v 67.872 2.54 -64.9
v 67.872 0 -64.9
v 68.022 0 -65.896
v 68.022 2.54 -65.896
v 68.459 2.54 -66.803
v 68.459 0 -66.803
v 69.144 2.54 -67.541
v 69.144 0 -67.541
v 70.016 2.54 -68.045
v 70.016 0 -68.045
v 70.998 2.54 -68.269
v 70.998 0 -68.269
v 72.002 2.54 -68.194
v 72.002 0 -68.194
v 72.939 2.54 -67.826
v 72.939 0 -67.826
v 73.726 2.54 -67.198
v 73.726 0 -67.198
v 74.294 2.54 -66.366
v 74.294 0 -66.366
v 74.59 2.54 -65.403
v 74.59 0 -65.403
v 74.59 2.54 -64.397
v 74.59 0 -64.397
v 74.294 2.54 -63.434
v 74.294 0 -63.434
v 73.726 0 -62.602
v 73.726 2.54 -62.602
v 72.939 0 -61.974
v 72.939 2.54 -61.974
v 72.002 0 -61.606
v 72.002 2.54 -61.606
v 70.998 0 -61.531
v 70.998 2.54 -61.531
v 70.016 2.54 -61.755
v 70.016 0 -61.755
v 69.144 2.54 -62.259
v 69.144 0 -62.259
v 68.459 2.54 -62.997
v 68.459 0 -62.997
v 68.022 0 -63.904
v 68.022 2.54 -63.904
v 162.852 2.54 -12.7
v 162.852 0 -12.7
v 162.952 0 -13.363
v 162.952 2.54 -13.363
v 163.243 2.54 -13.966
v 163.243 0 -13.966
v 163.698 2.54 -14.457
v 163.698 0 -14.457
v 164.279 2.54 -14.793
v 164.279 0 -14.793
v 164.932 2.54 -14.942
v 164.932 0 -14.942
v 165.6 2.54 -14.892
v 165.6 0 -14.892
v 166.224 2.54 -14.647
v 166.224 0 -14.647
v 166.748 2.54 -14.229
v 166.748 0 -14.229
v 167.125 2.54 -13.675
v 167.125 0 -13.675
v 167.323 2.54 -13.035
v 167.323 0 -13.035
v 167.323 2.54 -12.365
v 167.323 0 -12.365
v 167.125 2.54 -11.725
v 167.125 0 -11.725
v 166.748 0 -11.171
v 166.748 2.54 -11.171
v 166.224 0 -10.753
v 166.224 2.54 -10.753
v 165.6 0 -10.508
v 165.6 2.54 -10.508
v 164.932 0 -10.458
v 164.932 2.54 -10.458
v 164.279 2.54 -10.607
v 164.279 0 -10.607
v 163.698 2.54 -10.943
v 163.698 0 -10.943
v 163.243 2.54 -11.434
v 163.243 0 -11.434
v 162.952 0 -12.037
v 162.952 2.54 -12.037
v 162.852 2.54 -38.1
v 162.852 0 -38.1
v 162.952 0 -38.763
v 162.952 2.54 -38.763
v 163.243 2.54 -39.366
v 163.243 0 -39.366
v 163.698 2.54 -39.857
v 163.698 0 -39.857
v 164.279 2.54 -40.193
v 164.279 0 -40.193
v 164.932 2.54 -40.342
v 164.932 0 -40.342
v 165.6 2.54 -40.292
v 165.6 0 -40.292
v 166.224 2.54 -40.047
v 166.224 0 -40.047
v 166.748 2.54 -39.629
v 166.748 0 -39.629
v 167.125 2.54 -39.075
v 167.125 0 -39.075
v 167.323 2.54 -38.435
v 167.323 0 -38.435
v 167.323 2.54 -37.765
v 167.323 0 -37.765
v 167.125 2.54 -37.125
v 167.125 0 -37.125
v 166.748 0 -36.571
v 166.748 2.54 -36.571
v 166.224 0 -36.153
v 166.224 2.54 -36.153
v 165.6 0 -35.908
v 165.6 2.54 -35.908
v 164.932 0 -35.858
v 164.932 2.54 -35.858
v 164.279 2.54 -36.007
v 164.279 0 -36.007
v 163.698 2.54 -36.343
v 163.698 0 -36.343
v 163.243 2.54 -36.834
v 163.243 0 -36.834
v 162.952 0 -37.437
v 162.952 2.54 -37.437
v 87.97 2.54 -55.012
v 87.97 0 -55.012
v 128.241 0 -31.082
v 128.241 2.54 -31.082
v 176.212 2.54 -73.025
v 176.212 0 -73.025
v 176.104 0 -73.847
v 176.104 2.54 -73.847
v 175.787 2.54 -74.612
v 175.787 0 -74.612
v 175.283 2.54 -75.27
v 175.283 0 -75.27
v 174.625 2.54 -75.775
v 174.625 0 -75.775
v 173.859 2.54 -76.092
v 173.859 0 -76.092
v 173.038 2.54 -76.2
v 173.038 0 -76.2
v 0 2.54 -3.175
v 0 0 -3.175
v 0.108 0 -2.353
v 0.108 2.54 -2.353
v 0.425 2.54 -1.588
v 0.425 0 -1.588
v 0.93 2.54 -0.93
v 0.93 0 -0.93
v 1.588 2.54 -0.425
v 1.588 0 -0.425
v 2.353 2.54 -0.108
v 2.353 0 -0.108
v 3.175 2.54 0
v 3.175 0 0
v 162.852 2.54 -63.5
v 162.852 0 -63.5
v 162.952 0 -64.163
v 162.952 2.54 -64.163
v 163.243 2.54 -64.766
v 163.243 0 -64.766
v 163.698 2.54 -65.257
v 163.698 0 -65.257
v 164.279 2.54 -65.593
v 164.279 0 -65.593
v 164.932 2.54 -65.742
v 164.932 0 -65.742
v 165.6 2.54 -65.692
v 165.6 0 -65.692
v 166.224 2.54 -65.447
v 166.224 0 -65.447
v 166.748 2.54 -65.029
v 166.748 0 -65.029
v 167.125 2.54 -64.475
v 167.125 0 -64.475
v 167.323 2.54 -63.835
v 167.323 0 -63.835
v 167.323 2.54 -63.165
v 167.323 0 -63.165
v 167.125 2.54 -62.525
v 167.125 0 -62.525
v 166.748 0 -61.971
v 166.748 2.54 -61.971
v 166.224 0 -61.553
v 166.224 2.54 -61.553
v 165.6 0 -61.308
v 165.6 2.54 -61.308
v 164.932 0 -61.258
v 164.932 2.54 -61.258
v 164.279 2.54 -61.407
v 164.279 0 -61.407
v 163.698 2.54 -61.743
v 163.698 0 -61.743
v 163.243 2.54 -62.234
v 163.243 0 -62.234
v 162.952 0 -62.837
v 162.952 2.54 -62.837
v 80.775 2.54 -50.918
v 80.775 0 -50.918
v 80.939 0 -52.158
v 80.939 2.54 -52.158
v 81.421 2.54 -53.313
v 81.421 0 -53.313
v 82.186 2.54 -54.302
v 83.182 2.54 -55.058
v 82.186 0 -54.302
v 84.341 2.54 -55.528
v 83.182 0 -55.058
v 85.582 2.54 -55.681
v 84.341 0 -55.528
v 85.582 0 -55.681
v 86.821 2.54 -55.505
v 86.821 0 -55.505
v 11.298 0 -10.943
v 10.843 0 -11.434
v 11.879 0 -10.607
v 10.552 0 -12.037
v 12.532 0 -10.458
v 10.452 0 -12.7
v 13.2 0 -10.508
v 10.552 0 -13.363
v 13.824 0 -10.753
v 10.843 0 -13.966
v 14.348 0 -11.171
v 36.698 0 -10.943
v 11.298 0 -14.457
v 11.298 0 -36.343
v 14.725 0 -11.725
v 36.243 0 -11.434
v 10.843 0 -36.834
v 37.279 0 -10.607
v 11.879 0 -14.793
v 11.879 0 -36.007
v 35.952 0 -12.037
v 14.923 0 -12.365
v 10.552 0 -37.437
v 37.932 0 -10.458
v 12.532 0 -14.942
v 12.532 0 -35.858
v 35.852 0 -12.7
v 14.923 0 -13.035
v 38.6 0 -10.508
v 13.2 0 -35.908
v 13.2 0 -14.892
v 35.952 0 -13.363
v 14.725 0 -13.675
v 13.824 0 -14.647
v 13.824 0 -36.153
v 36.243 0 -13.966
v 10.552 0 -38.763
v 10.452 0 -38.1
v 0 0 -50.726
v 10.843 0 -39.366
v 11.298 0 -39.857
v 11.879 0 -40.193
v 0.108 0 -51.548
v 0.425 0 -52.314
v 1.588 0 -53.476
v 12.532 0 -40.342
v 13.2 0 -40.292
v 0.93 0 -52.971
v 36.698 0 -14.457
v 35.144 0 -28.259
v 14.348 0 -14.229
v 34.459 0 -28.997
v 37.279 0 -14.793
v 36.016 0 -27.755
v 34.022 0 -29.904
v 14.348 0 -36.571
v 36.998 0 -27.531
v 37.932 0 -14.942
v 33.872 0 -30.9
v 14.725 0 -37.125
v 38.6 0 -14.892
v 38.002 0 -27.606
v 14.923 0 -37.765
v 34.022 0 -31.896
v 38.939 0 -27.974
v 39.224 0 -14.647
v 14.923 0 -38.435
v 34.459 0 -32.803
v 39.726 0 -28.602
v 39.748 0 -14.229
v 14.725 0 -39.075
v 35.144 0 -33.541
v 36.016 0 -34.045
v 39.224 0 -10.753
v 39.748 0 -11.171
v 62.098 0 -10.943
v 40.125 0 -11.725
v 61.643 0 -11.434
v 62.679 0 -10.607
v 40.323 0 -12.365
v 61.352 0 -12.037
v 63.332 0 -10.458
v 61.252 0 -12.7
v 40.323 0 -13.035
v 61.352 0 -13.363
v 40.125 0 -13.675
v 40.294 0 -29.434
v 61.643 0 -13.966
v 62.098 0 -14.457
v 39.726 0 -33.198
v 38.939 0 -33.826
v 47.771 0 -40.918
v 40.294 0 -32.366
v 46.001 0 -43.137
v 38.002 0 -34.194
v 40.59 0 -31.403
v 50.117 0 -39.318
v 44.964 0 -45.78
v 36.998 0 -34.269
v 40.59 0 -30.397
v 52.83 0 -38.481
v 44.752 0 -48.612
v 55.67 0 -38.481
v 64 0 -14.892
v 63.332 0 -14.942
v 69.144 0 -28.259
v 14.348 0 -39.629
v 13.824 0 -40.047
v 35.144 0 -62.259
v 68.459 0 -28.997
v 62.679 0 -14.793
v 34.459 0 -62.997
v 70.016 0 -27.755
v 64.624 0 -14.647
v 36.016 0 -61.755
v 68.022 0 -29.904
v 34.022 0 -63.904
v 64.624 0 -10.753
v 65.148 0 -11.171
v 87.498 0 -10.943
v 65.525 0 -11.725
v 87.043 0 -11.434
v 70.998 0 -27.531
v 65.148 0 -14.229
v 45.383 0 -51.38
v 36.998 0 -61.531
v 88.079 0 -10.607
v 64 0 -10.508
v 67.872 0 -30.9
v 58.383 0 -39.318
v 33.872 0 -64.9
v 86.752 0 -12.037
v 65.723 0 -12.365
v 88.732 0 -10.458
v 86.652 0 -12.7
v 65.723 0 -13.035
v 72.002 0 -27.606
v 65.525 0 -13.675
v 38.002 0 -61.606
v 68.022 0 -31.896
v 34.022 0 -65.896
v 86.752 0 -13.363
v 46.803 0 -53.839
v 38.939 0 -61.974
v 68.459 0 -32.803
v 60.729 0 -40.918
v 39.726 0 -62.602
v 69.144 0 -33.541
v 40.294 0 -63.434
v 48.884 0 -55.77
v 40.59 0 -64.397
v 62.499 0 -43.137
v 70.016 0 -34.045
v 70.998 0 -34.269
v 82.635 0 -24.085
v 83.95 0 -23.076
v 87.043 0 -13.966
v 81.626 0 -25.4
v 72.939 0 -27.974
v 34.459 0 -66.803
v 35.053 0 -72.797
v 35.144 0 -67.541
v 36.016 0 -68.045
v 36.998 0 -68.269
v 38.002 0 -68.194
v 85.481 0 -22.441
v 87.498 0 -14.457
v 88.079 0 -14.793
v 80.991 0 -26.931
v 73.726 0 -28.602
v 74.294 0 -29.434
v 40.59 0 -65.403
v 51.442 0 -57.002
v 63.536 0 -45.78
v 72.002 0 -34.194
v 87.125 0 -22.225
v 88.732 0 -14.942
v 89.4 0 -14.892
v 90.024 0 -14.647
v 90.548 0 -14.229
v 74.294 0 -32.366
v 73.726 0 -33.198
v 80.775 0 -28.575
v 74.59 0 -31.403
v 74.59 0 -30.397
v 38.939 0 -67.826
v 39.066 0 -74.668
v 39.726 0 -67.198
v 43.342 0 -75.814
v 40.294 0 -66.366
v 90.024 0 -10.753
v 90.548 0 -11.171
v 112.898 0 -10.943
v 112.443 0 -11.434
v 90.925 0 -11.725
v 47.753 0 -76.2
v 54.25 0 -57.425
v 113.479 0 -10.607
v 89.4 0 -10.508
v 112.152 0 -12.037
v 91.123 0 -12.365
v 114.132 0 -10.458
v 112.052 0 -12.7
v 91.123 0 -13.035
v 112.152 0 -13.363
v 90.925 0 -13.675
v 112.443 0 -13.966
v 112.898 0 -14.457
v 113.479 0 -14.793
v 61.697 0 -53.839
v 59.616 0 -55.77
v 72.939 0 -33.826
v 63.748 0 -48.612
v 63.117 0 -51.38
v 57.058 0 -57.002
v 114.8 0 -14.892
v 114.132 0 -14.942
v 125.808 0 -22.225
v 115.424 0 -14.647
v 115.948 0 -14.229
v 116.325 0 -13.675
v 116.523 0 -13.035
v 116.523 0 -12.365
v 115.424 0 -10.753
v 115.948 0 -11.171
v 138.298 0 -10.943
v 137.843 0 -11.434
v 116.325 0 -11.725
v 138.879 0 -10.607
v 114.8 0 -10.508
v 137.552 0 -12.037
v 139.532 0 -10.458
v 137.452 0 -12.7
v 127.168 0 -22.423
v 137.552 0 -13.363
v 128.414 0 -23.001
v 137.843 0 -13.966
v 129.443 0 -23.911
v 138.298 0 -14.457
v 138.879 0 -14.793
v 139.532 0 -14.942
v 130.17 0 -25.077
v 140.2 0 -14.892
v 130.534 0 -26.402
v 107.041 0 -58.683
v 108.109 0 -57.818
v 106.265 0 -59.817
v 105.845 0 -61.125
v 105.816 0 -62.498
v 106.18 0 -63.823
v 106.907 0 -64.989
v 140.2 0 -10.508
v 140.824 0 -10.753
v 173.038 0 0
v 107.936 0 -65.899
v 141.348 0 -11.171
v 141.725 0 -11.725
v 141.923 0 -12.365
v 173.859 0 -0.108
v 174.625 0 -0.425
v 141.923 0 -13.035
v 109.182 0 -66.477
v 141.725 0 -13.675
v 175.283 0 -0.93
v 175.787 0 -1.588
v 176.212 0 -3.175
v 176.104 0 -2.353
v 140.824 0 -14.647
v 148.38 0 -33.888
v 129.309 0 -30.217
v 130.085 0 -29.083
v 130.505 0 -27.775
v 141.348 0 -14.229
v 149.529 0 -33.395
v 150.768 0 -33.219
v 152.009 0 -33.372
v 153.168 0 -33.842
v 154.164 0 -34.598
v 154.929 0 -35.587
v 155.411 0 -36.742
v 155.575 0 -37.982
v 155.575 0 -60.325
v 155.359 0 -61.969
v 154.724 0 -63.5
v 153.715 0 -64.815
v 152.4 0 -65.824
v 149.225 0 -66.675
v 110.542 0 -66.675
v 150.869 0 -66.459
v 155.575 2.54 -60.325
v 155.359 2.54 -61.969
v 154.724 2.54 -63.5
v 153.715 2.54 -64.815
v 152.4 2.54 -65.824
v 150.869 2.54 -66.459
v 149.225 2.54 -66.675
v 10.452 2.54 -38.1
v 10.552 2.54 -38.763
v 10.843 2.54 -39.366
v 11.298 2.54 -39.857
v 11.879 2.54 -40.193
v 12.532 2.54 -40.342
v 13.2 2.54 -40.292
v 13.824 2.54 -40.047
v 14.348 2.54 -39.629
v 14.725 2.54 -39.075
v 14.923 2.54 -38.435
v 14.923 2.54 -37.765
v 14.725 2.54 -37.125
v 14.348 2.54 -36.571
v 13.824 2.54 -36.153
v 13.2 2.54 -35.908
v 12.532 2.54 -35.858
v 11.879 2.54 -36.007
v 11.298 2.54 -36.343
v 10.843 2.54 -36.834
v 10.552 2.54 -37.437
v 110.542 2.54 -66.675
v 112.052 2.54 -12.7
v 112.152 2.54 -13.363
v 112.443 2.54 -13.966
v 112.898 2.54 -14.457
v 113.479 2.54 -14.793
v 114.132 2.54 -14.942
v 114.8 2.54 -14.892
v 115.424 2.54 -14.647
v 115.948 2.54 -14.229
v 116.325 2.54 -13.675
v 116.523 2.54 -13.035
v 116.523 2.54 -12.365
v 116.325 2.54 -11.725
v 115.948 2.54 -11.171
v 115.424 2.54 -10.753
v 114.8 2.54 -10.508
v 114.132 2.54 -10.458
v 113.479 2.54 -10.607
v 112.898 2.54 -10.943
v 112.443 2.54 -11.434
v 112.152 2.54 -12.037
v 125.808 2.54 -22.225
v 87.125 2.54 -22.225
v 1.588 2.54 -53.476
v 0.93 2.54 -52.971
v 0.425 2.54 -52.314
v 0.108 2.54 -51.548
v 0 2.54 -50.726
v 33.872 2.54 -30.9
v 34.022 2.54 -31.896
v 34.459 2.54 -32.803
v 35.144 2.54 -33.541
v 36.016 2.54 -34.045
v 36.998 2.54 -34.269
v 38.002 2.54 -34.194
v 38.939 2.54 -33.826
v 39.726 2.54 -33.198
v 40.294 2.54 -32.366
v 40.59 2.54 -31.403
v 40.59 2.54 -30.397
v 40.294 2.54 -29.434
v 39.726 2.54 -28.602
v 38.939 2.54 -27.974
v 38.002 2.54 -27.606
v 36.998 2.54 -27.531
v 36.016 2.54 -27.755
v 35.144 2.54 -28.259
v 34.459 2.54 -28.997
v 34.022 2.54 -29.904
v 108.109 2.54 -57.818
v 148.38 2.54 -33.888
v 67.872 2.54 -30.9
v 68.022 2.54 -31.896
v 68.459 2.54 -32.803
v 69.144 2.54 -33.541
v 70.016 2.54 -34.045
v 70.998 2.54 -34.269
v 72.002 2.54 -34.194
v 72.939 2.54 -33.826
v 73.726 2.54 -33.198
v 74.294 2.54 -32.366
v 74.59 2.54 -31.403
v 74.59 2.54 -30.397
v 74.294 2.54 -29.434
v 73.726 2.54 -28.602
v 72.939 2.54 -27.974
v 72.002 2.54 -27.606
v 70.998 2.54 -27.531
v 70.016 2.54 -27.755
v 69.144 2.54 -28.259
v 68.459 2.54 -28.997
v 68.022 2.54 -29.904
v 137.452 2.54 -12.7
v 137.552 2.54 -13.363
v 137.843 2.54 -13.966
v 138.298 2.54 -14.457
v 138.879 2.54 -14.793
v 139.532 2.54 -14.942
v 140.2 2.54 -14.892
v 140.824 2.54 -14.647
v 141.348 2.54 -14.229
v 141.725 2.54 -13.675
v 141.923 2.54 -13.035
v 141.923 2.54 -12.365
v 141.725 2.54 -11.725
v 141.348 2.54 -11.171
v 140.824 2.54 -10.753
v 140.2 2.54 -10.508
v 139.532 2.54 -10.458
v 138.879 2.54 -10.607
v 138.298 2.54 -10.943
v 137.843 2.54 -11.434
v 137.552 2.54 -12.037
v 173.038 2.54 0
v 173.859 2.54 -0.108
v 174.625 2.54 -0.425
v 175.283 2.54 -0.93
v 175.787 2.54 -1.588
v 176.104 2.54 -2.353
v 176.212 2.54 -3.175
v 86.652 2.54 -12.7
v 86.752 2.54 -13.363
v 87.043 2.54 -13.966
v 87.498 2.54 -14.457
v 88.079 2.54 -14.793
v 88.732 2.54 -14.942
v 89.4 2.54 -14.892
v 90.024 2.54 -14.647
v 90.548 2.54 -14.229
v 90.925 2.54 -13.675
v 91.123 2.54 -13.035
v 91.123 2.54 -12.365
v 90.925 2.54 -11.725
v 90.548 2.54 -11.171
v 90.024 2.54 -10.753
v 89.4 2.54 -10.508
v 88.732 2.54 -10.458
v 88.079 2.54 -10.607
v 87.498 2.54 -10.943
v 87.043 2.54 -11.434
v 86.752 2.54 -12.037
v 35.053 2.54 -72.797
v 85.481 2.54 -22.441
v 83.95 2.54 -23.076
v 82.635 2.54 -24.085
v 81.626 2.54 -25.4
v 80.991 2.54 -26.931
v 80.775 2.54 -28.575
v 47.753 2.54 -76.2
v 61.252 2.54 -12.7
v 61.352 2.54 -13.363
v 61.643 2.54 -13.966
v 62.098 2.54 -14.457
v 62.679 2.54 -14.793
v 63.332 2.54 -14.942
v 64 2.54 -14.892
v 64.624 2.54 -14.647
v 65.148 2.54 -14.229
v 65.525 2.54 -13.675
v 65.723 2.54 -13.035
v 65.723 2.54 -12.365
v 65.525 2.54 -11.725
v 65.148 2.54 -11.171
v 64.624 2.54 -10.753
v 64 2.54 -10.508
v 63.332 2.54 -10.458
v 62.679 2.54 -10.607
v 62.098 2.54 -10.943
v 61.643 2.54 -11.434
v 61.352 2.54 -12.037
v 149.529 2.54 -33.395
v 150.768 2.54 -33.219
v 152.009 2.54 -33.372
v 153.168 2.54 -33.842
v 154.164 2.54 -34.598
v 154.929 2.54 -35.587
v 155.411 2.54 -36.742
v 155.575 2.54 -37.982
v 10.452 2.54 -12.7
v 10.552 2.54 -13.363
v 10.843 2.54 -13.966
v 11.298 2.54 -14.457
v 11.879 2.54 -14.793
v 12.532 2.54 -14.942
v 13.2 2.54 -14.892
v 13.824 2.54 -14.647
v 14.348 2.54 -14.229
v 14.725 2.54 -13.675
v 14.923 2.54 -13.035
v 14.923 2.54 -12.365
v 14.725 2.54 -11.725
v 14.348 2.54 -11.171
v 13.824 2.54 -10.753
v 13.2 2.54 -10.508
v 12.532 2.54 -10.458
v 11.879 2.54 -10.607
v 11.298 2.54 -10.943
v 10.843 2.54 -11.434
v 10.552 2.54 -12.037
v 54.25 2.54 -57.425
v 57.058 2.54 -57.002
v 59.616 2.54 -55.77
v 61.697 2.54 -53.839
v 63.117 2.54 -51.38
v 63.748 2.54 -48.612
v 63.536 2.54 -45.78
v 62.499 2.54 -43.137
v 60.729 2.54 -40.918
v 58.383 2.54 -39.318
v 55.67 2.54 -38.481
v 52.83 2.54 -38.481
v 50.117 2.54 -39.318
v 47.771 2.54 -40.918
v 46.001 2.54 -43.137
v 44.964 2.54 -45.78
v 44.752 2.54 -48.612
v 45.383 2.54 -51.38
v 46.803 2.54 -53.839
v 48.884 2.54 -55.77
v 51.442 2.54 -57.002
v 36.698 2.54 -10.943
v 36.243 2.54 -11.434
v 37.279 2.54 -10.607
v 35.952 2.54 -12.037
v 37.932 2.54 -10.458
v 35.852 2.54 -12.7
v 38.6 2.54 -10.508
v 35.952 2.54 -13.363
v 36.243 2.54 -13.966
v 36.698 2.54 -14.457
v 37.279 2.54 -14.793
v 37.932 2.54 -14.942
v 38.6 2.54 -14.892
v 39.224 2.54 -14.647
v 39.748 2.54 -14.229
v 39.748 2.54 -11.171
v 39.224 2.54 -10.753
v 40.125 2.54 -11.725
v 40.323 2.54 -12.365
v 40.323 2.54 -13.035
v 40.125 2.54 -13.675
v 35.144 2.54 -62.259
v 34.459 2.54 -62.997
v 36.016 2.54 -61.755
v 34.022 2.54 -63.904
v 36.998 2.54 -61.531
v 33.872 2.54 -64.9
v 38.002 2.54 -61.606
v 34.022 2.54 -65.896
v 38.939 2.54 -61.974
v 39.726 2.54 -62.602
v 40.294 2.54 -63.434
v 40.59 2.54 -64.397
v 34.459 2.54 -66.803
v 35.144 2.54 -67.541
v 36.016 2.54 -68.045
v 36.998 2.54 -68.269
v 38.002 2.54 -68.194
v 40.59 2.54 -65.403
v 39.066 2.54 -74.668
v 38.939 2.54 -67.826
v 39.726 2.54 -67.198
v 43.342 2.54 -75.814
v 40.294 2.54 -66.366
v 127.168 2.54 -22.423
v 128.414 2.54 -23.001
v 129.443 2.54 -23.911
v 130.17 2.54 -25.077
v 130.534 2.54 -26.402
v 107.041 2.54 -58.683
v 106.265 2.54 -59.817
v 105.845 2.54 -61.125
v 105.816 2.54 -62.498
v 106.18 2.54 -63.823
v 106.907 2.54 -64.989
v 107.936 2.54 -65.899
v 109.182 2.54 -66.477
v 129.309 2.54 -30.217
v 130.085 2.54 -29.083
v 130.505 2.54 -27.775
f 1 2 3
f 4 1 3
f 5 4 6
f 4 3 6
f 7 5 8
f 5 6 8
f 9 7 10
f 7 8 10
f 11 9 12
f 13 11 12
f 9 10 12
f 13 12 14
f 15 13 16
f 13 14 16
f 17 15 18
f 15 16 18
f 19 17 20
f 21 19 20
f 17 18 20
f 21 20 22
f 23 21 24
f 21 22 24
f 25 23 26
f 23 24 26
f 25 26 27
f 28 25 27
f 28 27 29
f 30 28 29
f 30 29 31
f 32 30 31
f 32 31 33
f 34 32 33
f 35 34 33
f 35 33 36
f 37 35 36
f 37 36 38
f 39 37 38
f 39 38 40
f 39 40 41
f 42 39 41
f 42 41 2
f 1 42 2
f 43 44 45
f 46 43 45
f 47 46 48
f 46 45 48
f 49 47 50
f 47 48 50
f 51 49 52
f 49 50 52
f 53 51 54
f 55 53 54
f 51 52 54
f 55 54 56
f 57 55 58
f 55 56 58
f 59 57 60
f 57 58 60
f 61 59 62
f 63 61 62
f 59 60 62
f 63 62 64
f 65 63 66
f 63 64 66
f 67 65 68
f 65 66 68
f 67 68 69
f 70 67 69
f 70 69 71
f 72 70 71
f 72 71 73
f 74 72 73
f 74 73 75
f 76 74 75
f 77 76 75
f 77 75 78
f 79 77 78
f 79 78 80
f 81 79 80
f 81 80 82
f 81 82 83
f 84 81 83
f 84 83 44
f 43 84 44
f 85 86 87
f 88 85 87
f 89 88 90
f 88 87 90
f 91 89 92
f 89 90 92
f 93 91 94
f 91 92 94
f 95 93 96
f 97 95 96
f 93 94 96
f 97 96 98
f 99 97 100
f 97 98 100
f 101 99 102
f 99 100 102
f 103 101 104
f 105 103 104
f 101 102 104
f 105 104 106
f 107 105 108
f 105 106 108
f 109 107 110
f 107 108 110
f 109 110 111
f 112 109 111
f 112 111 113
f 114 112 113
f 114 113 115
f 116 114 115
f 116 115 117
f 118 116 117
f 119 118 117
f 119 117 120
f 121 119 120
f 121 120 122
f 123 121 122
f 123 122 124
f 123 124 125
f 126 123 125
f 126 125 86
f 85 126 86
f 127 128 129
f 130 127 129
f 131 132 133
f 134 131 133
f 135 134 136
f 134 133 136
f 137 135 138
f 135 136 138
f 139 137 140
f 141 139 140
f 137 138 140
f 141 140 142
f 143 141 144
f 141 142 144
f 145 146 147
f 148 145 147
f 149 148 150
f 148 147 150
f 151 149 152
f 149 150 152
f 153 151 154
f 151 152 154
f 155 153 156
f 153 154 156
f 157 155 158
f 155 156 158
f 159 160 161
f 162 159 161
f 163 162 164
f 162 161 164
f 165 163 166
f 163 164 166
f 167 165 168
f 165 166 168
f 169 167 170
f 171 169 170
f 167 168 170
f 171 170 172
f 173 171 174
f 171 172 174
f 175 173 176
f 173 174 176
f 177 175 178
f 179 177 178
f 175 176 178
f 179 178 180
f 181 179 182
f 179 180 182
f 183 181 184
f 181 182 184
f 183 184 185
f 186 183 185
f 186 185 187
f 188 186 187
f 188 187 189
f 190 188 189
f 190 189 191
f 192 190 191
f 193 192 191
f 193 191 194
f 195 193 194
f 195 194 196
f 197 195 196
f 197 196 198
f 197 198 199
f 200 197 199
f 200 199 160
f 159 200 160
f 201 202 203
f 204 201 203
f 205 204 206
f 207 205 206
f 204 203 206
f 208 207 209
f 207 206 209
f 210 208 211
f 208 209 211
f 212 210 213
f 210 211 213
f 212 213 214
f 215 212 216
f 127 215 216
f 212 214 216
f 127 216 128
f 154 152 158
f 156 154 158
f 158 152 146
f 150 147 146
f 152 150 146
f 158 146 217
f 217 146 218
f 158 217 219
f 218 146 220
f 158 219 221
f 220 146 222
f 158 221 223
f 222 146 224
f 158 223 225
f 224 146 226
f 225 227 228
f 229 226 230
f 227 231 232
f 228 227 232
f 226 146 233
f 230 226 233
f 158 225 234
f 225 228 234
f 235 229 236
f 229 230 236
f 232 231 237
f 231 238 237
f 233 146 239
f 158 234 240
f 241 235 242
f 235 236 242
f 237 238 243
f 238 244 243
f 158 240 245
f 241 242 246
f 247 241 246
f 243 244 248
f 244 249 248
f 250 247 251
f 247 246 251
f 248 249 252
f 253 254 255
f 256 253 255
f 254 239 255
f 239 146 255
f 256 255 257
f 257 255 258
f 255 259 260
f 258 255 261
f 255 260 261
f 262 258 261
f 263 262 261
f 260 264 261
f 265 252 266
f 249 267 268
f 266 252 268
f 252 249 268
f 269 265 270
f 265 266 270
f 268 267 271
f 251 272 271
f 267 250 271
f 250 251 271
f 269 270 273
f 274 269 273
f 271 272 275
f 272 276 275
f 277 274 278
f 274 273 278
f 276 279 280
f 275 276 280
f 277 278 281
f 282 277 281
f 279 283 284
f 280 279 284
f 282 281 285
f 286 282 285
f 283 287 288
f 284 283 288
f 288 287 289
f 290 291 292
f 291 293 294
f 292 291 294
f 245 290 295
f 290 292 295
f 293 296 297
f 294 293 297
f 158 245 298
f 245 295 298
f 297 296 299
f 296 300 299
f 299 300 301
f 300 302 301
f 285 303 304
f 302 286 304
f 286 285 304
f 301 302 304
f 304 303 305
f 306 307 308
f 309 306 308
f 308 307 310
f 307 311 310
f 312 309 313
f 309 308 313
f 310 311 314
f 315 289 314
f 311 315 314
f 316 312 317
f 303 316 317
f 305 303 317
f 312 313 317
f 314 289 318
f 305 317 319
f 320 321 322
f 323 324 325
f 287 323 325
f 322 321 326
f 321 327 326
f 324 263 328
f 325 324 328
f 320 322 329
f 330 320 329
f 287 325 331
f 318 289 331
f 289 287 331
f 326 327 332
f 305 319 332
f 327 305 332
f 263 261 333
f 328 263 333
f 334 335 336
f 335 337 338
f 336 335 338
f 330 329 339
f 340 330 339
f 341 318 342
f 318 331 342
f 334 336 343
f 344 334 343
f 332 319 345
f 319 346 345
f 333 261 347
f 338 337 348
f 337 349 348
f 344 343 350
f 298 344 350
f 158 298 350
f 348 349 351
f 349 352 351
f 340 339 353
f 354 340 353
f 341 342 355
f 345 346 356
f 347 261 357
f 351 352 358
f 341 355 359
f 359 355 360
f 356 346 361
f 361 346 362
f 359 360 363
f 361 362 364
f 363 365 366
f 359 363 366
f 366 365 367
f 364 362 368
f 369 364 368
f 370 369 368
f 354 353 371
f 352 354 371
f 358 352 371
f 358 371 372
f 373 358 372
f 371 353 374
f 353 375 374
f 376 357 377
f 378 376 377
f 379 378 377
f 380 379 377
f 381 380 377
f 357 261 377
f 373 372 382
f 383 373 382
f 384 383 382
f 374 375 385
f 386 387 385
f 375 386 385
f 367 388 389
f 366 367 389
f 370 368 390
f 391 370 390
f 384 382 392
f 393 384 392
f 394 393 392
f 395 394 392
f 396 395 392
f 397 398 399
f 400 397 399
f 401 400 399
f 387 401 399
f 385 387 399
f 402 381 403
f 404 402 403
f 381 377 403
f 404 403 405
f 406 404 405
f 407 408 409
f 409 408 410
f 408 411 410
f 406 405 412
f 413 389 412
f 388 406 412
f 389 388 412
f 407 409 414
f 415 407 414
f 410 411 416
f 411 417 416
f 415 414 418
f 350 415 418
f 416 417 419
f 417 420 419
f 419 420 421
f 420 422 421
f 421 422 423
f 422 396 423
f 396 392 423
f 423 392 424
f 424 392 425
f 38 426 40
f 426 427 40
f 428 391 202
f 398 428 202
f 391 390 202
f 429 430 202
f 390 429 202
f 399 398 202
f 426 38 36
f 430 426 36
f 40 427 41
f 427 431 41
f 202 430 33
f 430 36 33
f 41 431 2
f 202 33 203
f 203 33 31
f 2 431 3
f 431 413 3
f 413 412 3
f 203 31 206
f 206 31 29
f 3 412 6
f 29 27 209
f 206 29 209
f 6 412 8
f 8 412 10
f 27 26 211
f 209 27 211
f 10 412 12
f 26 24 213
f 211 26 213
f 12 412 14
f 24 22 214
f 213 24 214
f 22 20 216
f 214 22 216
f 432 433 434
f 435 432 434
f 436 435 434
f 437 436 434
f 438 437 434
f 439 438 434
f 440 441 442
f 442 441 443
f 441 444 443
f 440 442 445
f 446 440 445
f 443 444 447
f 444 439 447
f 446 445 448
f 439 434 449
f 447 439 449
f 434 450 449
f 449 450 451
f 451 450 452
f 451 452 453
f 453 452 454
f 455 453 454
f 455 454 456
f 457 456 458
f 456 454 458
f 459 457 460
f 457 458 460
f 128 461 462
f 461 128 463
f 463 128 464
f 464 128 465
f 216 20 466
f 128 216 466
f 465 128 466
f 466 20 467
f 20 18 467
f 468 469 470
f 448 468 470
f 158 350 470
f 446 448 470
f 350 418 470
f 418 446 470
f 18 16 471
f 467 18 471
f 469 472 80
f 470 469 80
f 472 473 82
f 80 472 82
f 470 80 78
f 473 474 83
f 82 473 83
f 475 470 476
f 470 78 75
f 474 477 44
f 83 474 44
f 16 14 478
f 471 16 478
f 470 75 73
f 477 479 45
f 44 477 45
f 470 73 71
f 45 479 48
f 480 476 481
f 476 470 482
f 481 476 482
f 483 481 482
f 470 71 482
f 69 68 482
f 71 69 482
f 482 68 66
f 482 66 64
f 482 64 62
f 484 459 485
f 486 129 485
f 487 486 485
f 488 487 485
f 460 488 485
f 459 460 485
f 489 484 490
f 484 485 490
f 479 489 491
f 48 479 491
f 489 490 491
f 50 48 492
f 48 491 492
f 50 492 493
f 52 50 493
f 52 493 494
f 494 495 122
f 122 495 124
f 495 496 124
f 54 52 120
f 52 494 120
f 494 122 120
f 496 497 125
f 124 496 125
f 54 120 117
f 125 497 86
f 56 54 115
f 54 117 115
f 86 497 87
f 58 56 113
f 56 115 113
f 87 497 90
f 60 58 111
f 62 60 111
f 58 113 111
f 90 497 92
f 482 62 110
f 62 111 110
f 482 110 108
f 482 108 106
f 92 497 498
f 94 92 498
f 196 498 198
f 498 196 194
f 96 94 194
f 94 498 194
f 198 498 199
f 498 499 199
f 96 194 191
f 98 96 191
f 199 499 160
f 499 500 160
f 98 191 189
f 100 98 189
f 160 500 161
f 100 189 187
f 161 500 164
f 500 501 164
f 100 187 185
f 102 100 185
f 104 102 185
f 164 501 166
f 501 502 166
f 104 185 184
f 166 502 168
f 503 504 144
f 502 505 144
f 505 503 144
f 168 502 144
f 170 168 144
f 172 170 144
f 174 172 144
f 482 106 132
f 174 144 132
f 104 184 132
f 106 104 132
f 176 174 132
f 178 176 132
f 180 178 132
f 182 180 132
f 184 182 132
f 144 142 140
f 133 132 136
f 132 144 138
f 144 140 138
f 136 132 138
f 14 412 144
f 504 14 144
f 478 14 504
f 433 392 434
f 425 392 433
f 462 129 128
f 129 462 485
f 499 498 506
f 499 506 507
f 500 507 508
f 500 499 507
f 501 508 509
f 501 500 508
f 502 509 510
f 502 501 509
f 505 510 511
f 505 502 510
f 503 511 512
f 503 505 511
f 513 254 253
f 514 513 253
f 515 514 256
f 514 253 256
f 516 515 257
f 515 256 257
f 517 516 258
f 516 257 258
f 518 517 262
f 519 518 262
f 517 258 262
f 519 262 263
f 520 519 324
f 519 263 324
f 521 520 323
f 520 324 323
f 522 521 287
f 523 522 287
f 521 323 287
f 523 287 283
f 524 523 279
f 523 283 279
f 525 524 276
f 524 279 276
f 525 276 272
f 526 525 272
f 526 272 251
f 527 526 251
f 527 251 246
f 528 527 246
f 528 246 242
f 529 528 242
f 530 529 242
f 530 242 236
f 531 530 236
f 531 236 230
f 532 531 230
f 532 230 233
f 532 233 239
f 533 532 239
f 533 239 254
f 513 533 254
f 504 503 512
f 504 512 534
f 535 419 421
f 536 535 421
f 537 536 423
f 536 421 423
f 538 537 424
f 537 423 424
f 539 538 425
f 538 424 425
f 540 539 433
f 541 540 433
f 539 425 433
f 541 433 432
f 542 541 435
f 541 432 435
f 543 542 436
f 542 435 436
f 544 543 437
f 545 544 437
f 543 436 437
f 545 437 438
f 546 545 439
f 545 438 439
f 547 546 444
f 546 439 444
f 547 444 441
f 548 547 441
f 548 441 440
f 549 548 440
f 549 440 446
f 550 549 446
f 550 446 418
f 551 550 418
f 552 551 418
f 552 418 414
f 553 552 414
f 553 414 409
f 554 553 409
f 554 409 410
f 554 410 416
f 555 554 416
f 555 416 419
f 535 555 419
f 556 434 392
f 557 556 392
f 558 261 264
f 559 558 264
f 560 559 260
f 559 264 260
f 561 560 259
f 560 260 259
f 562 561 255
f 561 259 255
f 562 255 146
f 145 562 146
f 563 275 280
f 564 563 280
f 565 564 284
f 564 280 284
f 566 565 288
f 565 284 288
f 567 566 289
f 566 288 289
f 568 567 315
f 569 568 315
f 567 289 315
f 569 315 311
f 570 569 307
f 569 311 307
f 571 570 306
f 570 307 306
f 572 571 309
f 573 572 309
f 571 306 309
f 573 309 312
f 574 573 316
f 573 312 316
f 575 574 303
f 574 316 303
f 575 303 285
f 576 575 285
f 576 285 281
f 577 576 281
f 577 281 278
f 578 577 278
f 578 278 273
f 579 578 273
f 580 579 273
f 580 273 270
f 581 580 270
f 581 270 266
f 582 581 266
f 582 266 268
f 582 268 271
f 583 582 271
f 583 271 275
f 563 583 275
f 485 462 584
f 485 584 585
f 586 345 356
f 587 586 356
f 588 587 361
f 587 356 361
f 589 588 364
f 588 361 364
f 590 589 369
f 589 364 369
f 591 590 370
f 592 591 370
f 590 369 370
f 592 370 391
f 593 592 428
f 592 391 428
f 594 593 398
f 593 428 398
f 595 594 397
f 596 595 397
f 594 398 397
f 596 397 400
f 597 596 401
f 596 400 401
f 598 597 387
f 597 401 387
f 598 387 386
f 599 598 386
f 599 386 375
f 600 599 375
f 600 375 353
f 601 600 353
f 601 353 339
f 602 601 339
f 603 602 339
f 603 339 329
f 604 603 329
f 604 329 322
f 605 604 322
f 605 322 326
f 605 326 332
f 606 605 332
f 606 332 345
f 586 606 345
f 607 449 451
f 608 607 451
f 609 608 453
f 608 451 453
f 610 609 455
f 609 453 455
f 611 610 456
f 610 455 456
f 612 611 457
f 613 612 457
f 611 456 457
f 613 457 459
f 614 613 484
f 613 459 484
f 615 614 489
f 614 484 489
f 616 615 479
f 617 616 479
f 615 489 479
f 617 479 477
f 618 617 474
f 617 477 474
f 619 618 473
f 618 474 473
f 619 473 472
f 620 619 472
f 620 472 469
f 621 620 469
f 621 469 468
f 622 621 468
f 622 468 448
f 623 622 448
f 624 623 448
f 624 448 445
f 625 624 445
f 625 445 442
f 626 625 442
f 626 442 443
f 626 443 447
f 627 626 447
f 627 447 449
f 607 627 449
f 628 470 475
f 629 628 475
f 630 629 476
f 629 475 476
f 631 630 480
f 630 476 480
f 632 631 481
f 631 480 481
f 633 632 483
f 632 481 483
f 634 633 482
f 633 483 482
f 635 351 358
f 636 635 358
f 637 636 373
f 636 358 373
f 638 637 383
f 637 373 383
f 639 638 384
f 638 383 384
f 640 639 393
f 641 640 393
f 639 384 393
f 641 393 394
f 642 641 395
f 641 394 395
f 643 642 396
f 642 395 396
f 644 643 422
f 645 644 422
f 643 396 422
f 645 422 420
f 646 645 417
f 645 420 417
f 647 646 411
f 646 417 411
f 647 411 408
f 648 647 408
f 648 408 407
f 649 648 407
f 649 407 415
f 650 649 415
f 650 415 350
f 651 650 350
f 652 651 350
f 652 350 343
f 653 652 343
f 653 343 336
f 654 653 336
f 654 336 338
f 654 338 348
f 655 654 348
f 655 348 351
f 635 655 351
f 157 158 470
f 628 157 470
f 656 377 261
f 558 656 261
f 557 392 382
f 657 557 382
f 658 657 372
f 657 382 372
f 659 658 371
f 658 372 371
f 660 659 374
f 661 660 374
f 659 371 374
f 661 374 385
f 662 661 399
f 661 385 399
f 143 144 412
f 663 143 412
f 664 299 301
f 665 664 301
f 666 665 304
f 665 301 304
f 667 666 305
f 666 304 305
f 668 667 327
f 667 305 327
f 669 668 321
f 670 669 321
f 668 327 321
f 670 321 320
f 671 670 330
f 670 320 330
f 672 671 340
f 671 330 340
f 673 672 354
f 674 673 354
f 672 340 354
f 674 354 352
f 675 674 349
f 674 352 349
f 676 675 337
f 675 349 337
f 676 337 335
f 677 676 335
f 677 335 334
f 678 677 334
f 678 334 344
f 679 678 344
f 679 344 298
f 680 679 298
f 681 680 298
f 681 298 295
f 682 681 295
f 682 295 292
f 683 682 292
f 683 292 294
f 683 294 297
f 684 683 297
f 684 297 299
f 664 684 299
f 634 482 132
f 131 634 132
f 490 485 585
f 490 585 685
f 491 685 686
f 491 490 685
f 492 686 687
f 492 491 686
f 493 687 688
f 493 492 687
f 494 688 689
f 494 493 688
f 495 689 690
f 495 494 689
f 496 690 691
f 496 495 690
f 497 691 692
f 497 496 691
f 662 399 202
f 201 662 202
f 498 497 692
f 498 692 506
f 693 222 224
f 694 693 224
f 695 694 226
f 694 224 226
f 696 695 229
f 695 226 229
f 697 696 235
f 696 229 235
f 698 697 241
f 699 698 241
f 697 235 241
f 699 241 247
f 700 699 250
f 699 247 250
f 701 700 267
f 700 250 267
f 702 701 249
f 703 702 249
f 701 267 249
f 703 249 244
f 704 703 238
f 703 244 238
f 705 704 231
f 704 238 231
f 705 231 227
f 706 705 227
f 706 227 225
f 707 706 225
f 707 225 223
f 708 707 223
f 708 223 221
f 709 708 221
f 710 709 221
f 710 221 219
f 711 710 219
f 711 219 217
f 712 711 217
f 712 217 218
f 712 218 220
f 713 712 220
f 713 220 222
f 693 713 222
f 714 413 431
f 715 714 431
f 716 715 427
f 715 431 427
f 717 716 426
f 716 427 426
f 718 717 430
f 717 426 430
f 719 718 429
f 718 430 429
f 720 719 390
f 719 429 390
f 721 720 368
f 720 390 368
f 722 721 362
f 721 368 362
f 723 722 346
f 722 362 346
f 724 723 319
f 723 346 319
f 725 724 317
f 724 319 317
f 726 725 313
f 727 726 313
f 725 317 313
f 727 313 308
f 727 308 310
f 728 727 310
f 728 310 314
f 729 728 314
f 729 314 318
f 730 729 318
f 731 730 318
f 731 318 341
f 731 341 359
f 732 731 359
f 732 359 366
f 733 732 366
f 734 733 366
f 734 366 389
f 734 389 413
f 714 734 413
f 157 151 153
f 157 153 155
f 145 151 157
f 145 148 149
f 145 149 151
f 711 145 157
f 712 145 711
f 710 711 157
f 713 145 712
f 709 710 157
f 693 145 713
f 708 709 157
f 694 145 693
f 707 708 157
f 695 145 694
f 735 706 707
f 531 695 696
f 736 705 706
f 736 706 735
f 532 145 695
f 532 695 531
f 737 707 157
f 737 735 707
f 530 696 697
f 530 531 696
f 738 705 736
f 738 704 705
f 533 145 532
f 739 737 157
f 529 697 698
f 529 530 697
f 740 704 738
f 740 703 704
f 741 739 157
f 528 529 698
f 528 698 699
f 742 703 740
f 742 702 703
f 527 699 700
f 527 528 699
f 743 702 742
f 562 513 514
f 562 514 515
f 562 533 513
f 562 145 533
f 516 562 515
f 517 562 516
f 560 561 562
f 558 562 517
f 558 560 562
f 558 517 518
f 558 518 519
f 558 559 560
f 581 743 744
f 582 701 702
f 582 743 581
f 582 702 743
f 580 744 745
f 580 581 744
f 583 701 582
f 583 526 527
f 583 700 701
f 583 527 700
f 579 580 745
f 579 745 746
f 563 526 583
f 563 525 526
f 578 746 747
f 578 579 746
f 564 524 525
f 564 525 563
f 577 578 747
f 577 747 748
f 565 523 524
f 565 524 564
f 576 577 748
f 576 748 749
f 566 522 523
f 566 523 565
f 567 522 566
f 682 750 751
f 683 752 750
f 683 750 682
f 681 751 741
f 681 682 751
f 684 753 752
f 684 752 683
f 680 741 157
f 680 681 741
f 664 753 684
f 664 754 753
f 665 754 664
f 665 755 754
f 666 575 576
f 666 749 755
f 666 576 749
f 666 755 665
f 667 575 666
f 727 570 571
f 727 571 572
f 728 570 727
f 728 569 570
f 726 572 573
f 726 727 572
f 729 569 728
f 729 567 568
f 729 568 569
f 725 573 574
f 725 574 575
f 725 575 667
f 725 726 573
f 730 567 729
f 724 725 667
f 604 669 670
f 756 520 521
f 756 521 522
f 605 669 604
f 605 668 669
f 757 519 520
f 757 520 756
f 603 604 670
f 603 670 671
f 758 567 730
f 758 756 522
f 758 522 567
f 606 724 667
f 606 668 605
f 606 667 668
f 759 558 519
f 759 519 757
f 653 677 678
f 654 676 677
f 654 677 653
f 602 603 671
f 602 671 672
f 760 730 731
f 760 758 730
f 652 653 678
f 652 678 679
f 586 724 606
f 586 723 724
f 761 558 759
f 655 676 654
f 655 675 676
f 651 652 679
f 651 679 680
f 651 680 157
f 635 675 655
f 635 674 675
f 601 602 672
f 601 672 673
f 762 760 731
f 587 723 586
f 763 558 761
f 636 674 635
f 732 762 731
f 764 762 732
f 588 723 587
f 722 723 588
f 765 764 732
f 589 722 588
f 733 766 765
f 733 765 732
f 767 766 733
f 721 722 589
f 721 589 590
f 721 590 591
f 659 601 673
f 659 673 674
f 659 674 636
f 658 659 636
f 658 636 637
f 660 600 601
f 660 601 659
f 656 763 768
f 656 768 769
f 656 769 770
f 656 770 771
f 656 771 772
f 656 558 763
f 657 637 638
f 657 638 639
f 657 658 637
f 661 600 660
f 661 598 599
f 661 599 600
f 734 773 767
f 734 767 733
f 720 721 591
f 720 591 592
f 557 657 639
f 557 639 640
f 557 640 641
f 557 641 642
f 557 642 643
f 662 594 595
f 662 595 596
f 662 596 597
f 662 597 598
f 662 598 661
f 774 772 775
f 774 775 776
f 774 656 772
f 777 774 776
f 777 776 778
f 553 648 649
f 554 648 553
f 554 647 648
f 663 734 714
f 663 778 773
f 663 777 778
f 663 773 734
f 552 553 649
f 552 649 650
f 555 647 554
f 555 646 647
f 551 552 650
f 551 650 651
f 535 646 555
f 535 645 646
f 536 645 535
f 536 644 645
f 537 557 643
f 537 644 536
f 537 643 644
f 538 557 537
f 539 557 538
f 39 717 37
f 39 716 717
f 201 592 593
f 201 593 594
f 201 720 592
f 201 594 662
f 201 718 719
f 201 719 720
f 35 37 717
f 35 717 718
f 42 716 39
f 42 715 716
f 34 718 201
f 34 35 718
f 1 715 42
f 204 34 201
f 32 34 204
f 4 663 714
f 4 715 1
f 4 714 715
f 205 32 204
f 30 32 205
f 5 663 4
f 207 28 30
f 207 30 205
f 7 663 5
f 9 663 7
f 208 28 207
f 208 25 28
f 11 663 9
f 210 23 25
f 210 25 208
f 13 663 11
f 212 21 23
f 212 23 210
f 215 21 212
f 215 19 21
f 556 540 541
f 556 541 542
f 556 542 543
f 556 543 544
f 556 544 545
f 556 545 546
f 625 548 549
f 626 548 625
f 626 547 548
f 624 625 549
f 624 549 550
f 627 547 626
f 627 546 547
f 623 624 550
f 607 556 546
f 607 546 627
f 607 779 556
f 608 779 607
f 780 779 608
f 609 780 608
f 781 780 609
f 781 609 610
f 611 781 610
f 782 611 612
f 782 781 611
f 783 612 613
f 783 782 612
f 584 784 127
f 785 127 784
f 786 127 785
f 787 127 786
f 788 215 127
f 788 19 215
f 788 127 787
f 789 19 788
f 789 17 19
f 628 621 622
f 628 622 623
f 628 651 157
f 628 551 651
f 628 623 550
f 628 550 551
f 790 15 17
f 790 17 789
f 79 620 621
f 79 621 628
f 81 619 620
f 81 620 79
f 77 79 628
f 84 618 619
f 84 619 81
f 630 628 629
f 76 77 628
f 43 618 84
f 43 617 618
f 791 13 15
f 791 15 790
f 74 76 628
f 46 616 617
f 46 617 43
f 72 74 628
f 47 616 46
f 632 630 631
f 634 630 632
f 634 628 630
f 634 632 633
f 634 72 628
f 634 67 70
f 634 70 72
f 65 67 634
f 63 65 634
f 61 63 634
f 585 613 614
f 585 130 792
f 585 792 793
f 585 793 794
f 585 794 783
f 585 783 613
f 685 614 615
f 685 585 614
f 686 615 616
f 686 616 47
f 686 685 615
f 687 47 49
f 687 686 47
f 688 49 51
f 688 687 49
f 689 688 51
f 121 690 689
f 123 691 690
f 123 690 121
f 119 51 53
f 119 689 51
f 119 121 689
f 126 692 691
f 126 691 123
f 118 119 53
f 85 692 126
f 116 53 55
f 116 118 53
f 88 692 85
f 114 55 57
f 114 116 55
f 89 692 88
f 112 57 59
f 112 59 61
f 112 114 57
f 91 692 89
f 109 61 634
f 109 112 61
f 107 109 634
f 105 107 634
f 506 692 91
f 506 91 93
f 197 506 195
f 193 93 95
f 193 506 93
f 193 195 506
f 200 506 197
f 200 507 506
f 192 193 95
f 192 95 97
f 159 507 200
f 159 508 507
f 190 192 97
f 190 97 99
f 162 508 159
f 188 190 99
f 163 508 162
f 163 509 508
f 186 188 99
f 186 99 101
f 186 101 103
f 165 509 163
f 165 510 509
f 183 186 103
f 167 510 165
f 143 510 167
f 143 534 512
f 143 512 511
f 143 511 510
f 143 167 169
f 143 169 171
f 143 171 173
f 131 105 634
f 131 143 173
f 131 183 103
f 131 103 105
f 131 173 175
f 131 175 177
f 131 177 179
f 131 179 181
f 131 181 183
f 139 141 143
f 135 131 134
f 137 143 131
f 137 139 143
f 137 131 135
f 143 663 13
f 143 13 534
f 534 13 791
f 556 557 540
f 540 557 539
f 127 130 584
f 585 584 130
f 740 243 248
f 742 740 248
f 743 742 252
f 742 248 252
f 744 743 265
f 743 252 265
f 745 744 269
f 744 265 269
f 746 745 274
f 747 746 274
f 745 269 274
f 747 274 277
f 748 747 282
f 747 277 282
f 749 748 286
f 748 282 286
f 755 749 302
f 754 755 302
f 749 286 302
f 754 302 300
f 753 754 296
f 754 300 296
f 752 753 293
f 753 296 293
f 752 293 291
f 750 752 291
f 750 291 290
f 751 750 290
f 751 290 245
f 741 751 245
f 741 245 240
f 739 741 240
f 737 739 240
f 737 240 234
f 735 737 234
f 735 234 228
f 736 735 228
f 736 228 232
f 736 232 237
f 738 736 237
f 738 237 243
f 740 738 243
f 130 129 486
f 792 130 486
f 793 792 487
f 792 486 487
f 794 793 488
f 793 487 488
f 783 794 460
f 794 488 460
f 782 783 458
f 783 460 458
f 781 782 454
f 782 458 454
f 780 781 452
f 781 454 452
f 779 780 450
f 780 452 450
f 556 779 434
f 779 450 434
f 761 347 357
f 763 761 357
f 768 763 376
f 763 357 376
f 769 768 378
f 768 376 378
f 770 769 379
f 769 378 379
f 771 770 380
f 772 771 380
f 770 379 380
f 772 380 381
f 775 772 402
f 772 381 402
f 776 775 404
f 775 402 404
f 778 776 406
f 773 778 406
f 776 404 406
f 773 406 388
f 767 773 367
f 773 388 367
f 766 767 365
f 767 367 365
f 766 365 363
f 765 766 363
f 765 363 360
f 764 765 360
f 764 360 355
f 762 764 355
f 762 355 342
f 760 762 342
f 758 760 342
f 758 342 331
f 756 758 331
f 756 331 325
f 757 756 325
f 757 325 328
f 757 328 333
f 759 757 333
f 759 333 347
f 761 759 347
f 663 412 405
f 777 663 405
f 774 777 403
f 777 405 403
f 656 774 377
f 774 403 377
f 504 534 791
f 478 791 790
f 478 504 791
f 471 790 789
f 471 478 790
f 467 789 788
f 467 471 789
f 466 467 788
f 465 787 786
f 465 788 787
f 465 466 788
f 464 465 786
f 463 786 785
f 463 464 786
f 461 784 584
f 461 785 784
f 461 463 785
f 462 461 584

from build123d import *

# Parameters (mm, degrees)
BOSS_EXTRUDE1_DEPTH     = 2.54
F_8_CLEARANCE_HOLE1_D   = 4.4958
F_1_4_CLEARANCE_HOLE1_D = 6.7564
SKETCH6_R               = 9.525
CUT_EXTRUDE1_DEPTH      = 192.999314468


with BuildPart() as part:
    # Sketch1 → Boss-Extrude1 (new body)
    with BuildSketch(Plane(origin=(0, 0, 0), x_dir=(1, 0, 0), z_dir=(0, 1, 0))):
        with BuildLine():
            Line((0, 50.726050891), (0, 3.175))
            ThreePointArc((0, 3.175), (0.92993597, 0.92993597), (3.175, 0))
            Line((3.175, 0), (173.0375, 0))
            ThreePointArc((173.0375, 0), (175.28256403, 0.92993597), (176.2125, 3.175))
            Line((176.2125, 3.175), (176.2125, 73.025))
            ThreePointArc((176.2125, 73.025), (175.28256403, 75.27006403), (173.0375, 76.2))
            Line((173.0375, 76.2), (47.753083613, 76.2))
            ThreePointArc((47.753083613, 76.2), (41.179079868, 75.334515988), (35.053083613, 72.797045256))
            Line((35.053083613, 72.797045256), (1.5875, 53.475681548))
            ThreePointArc((1.5875, 53.475681548), (0.425369343, 52.313550891), (0, 50.726050891))
        make_face()
    extrude(amount=BOSS_EXTRUDE1_DEPTH)

    # #8 Clearance Hole1 (through all)
    with Locations(Plane(origin=(0, 2.54, 0), x_dir=(1, 0, 0), z_dir=(0, 1, 0))):
        with Locations((12.7, 12.7), (38.1, 12.7), (88.9, 12.7), (63.5, 12.7), (114.3, 12.7), (139.7, 12.7), (165.1, 12.7), (165.1, 63.5), (165.1, 38.1), (12.7, 38.1)):
            Hole(F_8_CLEARANCE_HOLE1_D / 2)

    # 1/4 Clearance Hole1 (through all)
    with Locations(Plane(origin=(0, 2.54, 0), x_dir=(1, 0, 0), z_dir=(0, 1, 0))):
        with Locations((37.25, 30.9), (37.25, 64.9), (71.25, 64.9), (71.25, 30.9)):
            Hole(F_1_4_CLEARANCE_HOLE1_D / 2)

    # Sketch6 → Cut-Extrude1 (cut, through all)
    with BuildSketch(Plane.XZ):
        with Locations(Location((54.25, -47.9, 0), (0, 0, 270))):
            Circle(SKETCH6_R)
        with BuildLine():
            Line((149.225, -66.675), (110.541932823, -66.675))
            ThreePointArc((110.541932823, -66.675), (105.949557162, -63.174043513), (108.108974619, -57.818343112))
            Line((108.108974619, -57.818343112), (148.379541796, -33.887504729))
            ThreePointArc((148.379541796, -33.887504729), (153.167753999, -33.842315673), (155.575, -37.981661618))
            Line((155.575, -37.981661618), (155.575, -60.325))
            ThreePointArc((155.575, -60.325), (153.715128061, -64.815128061), (149.225, -66.675))
        make_face()
        with BuildLine():
            Line((125.808067177, -22.225), (87.125, -22.225))
            ThreePointArc((87.125, -22.225), (82.634871939, -24.084871939), (80.775, -28.575))
            Line((80.775, -28.575), (80.775, -50.918338382))
            ThreePointArc((80.775, -50.918338382), (83.182246001, -55.057684327), (87.970458204, -55.012495271))
            Line((87.970458204, -55.012495271), (128.241025381, -31.081656888))
            ThreePointArc((128.241025381, -31.081656888), (130.400442838, -25.725956487), (125.808067177, -22.225))
        make_face()
    extrude(amount=-CUT_EXTRUDE1_DEPTH, mode=Mode.SUBTRACT)


solid = part.part
